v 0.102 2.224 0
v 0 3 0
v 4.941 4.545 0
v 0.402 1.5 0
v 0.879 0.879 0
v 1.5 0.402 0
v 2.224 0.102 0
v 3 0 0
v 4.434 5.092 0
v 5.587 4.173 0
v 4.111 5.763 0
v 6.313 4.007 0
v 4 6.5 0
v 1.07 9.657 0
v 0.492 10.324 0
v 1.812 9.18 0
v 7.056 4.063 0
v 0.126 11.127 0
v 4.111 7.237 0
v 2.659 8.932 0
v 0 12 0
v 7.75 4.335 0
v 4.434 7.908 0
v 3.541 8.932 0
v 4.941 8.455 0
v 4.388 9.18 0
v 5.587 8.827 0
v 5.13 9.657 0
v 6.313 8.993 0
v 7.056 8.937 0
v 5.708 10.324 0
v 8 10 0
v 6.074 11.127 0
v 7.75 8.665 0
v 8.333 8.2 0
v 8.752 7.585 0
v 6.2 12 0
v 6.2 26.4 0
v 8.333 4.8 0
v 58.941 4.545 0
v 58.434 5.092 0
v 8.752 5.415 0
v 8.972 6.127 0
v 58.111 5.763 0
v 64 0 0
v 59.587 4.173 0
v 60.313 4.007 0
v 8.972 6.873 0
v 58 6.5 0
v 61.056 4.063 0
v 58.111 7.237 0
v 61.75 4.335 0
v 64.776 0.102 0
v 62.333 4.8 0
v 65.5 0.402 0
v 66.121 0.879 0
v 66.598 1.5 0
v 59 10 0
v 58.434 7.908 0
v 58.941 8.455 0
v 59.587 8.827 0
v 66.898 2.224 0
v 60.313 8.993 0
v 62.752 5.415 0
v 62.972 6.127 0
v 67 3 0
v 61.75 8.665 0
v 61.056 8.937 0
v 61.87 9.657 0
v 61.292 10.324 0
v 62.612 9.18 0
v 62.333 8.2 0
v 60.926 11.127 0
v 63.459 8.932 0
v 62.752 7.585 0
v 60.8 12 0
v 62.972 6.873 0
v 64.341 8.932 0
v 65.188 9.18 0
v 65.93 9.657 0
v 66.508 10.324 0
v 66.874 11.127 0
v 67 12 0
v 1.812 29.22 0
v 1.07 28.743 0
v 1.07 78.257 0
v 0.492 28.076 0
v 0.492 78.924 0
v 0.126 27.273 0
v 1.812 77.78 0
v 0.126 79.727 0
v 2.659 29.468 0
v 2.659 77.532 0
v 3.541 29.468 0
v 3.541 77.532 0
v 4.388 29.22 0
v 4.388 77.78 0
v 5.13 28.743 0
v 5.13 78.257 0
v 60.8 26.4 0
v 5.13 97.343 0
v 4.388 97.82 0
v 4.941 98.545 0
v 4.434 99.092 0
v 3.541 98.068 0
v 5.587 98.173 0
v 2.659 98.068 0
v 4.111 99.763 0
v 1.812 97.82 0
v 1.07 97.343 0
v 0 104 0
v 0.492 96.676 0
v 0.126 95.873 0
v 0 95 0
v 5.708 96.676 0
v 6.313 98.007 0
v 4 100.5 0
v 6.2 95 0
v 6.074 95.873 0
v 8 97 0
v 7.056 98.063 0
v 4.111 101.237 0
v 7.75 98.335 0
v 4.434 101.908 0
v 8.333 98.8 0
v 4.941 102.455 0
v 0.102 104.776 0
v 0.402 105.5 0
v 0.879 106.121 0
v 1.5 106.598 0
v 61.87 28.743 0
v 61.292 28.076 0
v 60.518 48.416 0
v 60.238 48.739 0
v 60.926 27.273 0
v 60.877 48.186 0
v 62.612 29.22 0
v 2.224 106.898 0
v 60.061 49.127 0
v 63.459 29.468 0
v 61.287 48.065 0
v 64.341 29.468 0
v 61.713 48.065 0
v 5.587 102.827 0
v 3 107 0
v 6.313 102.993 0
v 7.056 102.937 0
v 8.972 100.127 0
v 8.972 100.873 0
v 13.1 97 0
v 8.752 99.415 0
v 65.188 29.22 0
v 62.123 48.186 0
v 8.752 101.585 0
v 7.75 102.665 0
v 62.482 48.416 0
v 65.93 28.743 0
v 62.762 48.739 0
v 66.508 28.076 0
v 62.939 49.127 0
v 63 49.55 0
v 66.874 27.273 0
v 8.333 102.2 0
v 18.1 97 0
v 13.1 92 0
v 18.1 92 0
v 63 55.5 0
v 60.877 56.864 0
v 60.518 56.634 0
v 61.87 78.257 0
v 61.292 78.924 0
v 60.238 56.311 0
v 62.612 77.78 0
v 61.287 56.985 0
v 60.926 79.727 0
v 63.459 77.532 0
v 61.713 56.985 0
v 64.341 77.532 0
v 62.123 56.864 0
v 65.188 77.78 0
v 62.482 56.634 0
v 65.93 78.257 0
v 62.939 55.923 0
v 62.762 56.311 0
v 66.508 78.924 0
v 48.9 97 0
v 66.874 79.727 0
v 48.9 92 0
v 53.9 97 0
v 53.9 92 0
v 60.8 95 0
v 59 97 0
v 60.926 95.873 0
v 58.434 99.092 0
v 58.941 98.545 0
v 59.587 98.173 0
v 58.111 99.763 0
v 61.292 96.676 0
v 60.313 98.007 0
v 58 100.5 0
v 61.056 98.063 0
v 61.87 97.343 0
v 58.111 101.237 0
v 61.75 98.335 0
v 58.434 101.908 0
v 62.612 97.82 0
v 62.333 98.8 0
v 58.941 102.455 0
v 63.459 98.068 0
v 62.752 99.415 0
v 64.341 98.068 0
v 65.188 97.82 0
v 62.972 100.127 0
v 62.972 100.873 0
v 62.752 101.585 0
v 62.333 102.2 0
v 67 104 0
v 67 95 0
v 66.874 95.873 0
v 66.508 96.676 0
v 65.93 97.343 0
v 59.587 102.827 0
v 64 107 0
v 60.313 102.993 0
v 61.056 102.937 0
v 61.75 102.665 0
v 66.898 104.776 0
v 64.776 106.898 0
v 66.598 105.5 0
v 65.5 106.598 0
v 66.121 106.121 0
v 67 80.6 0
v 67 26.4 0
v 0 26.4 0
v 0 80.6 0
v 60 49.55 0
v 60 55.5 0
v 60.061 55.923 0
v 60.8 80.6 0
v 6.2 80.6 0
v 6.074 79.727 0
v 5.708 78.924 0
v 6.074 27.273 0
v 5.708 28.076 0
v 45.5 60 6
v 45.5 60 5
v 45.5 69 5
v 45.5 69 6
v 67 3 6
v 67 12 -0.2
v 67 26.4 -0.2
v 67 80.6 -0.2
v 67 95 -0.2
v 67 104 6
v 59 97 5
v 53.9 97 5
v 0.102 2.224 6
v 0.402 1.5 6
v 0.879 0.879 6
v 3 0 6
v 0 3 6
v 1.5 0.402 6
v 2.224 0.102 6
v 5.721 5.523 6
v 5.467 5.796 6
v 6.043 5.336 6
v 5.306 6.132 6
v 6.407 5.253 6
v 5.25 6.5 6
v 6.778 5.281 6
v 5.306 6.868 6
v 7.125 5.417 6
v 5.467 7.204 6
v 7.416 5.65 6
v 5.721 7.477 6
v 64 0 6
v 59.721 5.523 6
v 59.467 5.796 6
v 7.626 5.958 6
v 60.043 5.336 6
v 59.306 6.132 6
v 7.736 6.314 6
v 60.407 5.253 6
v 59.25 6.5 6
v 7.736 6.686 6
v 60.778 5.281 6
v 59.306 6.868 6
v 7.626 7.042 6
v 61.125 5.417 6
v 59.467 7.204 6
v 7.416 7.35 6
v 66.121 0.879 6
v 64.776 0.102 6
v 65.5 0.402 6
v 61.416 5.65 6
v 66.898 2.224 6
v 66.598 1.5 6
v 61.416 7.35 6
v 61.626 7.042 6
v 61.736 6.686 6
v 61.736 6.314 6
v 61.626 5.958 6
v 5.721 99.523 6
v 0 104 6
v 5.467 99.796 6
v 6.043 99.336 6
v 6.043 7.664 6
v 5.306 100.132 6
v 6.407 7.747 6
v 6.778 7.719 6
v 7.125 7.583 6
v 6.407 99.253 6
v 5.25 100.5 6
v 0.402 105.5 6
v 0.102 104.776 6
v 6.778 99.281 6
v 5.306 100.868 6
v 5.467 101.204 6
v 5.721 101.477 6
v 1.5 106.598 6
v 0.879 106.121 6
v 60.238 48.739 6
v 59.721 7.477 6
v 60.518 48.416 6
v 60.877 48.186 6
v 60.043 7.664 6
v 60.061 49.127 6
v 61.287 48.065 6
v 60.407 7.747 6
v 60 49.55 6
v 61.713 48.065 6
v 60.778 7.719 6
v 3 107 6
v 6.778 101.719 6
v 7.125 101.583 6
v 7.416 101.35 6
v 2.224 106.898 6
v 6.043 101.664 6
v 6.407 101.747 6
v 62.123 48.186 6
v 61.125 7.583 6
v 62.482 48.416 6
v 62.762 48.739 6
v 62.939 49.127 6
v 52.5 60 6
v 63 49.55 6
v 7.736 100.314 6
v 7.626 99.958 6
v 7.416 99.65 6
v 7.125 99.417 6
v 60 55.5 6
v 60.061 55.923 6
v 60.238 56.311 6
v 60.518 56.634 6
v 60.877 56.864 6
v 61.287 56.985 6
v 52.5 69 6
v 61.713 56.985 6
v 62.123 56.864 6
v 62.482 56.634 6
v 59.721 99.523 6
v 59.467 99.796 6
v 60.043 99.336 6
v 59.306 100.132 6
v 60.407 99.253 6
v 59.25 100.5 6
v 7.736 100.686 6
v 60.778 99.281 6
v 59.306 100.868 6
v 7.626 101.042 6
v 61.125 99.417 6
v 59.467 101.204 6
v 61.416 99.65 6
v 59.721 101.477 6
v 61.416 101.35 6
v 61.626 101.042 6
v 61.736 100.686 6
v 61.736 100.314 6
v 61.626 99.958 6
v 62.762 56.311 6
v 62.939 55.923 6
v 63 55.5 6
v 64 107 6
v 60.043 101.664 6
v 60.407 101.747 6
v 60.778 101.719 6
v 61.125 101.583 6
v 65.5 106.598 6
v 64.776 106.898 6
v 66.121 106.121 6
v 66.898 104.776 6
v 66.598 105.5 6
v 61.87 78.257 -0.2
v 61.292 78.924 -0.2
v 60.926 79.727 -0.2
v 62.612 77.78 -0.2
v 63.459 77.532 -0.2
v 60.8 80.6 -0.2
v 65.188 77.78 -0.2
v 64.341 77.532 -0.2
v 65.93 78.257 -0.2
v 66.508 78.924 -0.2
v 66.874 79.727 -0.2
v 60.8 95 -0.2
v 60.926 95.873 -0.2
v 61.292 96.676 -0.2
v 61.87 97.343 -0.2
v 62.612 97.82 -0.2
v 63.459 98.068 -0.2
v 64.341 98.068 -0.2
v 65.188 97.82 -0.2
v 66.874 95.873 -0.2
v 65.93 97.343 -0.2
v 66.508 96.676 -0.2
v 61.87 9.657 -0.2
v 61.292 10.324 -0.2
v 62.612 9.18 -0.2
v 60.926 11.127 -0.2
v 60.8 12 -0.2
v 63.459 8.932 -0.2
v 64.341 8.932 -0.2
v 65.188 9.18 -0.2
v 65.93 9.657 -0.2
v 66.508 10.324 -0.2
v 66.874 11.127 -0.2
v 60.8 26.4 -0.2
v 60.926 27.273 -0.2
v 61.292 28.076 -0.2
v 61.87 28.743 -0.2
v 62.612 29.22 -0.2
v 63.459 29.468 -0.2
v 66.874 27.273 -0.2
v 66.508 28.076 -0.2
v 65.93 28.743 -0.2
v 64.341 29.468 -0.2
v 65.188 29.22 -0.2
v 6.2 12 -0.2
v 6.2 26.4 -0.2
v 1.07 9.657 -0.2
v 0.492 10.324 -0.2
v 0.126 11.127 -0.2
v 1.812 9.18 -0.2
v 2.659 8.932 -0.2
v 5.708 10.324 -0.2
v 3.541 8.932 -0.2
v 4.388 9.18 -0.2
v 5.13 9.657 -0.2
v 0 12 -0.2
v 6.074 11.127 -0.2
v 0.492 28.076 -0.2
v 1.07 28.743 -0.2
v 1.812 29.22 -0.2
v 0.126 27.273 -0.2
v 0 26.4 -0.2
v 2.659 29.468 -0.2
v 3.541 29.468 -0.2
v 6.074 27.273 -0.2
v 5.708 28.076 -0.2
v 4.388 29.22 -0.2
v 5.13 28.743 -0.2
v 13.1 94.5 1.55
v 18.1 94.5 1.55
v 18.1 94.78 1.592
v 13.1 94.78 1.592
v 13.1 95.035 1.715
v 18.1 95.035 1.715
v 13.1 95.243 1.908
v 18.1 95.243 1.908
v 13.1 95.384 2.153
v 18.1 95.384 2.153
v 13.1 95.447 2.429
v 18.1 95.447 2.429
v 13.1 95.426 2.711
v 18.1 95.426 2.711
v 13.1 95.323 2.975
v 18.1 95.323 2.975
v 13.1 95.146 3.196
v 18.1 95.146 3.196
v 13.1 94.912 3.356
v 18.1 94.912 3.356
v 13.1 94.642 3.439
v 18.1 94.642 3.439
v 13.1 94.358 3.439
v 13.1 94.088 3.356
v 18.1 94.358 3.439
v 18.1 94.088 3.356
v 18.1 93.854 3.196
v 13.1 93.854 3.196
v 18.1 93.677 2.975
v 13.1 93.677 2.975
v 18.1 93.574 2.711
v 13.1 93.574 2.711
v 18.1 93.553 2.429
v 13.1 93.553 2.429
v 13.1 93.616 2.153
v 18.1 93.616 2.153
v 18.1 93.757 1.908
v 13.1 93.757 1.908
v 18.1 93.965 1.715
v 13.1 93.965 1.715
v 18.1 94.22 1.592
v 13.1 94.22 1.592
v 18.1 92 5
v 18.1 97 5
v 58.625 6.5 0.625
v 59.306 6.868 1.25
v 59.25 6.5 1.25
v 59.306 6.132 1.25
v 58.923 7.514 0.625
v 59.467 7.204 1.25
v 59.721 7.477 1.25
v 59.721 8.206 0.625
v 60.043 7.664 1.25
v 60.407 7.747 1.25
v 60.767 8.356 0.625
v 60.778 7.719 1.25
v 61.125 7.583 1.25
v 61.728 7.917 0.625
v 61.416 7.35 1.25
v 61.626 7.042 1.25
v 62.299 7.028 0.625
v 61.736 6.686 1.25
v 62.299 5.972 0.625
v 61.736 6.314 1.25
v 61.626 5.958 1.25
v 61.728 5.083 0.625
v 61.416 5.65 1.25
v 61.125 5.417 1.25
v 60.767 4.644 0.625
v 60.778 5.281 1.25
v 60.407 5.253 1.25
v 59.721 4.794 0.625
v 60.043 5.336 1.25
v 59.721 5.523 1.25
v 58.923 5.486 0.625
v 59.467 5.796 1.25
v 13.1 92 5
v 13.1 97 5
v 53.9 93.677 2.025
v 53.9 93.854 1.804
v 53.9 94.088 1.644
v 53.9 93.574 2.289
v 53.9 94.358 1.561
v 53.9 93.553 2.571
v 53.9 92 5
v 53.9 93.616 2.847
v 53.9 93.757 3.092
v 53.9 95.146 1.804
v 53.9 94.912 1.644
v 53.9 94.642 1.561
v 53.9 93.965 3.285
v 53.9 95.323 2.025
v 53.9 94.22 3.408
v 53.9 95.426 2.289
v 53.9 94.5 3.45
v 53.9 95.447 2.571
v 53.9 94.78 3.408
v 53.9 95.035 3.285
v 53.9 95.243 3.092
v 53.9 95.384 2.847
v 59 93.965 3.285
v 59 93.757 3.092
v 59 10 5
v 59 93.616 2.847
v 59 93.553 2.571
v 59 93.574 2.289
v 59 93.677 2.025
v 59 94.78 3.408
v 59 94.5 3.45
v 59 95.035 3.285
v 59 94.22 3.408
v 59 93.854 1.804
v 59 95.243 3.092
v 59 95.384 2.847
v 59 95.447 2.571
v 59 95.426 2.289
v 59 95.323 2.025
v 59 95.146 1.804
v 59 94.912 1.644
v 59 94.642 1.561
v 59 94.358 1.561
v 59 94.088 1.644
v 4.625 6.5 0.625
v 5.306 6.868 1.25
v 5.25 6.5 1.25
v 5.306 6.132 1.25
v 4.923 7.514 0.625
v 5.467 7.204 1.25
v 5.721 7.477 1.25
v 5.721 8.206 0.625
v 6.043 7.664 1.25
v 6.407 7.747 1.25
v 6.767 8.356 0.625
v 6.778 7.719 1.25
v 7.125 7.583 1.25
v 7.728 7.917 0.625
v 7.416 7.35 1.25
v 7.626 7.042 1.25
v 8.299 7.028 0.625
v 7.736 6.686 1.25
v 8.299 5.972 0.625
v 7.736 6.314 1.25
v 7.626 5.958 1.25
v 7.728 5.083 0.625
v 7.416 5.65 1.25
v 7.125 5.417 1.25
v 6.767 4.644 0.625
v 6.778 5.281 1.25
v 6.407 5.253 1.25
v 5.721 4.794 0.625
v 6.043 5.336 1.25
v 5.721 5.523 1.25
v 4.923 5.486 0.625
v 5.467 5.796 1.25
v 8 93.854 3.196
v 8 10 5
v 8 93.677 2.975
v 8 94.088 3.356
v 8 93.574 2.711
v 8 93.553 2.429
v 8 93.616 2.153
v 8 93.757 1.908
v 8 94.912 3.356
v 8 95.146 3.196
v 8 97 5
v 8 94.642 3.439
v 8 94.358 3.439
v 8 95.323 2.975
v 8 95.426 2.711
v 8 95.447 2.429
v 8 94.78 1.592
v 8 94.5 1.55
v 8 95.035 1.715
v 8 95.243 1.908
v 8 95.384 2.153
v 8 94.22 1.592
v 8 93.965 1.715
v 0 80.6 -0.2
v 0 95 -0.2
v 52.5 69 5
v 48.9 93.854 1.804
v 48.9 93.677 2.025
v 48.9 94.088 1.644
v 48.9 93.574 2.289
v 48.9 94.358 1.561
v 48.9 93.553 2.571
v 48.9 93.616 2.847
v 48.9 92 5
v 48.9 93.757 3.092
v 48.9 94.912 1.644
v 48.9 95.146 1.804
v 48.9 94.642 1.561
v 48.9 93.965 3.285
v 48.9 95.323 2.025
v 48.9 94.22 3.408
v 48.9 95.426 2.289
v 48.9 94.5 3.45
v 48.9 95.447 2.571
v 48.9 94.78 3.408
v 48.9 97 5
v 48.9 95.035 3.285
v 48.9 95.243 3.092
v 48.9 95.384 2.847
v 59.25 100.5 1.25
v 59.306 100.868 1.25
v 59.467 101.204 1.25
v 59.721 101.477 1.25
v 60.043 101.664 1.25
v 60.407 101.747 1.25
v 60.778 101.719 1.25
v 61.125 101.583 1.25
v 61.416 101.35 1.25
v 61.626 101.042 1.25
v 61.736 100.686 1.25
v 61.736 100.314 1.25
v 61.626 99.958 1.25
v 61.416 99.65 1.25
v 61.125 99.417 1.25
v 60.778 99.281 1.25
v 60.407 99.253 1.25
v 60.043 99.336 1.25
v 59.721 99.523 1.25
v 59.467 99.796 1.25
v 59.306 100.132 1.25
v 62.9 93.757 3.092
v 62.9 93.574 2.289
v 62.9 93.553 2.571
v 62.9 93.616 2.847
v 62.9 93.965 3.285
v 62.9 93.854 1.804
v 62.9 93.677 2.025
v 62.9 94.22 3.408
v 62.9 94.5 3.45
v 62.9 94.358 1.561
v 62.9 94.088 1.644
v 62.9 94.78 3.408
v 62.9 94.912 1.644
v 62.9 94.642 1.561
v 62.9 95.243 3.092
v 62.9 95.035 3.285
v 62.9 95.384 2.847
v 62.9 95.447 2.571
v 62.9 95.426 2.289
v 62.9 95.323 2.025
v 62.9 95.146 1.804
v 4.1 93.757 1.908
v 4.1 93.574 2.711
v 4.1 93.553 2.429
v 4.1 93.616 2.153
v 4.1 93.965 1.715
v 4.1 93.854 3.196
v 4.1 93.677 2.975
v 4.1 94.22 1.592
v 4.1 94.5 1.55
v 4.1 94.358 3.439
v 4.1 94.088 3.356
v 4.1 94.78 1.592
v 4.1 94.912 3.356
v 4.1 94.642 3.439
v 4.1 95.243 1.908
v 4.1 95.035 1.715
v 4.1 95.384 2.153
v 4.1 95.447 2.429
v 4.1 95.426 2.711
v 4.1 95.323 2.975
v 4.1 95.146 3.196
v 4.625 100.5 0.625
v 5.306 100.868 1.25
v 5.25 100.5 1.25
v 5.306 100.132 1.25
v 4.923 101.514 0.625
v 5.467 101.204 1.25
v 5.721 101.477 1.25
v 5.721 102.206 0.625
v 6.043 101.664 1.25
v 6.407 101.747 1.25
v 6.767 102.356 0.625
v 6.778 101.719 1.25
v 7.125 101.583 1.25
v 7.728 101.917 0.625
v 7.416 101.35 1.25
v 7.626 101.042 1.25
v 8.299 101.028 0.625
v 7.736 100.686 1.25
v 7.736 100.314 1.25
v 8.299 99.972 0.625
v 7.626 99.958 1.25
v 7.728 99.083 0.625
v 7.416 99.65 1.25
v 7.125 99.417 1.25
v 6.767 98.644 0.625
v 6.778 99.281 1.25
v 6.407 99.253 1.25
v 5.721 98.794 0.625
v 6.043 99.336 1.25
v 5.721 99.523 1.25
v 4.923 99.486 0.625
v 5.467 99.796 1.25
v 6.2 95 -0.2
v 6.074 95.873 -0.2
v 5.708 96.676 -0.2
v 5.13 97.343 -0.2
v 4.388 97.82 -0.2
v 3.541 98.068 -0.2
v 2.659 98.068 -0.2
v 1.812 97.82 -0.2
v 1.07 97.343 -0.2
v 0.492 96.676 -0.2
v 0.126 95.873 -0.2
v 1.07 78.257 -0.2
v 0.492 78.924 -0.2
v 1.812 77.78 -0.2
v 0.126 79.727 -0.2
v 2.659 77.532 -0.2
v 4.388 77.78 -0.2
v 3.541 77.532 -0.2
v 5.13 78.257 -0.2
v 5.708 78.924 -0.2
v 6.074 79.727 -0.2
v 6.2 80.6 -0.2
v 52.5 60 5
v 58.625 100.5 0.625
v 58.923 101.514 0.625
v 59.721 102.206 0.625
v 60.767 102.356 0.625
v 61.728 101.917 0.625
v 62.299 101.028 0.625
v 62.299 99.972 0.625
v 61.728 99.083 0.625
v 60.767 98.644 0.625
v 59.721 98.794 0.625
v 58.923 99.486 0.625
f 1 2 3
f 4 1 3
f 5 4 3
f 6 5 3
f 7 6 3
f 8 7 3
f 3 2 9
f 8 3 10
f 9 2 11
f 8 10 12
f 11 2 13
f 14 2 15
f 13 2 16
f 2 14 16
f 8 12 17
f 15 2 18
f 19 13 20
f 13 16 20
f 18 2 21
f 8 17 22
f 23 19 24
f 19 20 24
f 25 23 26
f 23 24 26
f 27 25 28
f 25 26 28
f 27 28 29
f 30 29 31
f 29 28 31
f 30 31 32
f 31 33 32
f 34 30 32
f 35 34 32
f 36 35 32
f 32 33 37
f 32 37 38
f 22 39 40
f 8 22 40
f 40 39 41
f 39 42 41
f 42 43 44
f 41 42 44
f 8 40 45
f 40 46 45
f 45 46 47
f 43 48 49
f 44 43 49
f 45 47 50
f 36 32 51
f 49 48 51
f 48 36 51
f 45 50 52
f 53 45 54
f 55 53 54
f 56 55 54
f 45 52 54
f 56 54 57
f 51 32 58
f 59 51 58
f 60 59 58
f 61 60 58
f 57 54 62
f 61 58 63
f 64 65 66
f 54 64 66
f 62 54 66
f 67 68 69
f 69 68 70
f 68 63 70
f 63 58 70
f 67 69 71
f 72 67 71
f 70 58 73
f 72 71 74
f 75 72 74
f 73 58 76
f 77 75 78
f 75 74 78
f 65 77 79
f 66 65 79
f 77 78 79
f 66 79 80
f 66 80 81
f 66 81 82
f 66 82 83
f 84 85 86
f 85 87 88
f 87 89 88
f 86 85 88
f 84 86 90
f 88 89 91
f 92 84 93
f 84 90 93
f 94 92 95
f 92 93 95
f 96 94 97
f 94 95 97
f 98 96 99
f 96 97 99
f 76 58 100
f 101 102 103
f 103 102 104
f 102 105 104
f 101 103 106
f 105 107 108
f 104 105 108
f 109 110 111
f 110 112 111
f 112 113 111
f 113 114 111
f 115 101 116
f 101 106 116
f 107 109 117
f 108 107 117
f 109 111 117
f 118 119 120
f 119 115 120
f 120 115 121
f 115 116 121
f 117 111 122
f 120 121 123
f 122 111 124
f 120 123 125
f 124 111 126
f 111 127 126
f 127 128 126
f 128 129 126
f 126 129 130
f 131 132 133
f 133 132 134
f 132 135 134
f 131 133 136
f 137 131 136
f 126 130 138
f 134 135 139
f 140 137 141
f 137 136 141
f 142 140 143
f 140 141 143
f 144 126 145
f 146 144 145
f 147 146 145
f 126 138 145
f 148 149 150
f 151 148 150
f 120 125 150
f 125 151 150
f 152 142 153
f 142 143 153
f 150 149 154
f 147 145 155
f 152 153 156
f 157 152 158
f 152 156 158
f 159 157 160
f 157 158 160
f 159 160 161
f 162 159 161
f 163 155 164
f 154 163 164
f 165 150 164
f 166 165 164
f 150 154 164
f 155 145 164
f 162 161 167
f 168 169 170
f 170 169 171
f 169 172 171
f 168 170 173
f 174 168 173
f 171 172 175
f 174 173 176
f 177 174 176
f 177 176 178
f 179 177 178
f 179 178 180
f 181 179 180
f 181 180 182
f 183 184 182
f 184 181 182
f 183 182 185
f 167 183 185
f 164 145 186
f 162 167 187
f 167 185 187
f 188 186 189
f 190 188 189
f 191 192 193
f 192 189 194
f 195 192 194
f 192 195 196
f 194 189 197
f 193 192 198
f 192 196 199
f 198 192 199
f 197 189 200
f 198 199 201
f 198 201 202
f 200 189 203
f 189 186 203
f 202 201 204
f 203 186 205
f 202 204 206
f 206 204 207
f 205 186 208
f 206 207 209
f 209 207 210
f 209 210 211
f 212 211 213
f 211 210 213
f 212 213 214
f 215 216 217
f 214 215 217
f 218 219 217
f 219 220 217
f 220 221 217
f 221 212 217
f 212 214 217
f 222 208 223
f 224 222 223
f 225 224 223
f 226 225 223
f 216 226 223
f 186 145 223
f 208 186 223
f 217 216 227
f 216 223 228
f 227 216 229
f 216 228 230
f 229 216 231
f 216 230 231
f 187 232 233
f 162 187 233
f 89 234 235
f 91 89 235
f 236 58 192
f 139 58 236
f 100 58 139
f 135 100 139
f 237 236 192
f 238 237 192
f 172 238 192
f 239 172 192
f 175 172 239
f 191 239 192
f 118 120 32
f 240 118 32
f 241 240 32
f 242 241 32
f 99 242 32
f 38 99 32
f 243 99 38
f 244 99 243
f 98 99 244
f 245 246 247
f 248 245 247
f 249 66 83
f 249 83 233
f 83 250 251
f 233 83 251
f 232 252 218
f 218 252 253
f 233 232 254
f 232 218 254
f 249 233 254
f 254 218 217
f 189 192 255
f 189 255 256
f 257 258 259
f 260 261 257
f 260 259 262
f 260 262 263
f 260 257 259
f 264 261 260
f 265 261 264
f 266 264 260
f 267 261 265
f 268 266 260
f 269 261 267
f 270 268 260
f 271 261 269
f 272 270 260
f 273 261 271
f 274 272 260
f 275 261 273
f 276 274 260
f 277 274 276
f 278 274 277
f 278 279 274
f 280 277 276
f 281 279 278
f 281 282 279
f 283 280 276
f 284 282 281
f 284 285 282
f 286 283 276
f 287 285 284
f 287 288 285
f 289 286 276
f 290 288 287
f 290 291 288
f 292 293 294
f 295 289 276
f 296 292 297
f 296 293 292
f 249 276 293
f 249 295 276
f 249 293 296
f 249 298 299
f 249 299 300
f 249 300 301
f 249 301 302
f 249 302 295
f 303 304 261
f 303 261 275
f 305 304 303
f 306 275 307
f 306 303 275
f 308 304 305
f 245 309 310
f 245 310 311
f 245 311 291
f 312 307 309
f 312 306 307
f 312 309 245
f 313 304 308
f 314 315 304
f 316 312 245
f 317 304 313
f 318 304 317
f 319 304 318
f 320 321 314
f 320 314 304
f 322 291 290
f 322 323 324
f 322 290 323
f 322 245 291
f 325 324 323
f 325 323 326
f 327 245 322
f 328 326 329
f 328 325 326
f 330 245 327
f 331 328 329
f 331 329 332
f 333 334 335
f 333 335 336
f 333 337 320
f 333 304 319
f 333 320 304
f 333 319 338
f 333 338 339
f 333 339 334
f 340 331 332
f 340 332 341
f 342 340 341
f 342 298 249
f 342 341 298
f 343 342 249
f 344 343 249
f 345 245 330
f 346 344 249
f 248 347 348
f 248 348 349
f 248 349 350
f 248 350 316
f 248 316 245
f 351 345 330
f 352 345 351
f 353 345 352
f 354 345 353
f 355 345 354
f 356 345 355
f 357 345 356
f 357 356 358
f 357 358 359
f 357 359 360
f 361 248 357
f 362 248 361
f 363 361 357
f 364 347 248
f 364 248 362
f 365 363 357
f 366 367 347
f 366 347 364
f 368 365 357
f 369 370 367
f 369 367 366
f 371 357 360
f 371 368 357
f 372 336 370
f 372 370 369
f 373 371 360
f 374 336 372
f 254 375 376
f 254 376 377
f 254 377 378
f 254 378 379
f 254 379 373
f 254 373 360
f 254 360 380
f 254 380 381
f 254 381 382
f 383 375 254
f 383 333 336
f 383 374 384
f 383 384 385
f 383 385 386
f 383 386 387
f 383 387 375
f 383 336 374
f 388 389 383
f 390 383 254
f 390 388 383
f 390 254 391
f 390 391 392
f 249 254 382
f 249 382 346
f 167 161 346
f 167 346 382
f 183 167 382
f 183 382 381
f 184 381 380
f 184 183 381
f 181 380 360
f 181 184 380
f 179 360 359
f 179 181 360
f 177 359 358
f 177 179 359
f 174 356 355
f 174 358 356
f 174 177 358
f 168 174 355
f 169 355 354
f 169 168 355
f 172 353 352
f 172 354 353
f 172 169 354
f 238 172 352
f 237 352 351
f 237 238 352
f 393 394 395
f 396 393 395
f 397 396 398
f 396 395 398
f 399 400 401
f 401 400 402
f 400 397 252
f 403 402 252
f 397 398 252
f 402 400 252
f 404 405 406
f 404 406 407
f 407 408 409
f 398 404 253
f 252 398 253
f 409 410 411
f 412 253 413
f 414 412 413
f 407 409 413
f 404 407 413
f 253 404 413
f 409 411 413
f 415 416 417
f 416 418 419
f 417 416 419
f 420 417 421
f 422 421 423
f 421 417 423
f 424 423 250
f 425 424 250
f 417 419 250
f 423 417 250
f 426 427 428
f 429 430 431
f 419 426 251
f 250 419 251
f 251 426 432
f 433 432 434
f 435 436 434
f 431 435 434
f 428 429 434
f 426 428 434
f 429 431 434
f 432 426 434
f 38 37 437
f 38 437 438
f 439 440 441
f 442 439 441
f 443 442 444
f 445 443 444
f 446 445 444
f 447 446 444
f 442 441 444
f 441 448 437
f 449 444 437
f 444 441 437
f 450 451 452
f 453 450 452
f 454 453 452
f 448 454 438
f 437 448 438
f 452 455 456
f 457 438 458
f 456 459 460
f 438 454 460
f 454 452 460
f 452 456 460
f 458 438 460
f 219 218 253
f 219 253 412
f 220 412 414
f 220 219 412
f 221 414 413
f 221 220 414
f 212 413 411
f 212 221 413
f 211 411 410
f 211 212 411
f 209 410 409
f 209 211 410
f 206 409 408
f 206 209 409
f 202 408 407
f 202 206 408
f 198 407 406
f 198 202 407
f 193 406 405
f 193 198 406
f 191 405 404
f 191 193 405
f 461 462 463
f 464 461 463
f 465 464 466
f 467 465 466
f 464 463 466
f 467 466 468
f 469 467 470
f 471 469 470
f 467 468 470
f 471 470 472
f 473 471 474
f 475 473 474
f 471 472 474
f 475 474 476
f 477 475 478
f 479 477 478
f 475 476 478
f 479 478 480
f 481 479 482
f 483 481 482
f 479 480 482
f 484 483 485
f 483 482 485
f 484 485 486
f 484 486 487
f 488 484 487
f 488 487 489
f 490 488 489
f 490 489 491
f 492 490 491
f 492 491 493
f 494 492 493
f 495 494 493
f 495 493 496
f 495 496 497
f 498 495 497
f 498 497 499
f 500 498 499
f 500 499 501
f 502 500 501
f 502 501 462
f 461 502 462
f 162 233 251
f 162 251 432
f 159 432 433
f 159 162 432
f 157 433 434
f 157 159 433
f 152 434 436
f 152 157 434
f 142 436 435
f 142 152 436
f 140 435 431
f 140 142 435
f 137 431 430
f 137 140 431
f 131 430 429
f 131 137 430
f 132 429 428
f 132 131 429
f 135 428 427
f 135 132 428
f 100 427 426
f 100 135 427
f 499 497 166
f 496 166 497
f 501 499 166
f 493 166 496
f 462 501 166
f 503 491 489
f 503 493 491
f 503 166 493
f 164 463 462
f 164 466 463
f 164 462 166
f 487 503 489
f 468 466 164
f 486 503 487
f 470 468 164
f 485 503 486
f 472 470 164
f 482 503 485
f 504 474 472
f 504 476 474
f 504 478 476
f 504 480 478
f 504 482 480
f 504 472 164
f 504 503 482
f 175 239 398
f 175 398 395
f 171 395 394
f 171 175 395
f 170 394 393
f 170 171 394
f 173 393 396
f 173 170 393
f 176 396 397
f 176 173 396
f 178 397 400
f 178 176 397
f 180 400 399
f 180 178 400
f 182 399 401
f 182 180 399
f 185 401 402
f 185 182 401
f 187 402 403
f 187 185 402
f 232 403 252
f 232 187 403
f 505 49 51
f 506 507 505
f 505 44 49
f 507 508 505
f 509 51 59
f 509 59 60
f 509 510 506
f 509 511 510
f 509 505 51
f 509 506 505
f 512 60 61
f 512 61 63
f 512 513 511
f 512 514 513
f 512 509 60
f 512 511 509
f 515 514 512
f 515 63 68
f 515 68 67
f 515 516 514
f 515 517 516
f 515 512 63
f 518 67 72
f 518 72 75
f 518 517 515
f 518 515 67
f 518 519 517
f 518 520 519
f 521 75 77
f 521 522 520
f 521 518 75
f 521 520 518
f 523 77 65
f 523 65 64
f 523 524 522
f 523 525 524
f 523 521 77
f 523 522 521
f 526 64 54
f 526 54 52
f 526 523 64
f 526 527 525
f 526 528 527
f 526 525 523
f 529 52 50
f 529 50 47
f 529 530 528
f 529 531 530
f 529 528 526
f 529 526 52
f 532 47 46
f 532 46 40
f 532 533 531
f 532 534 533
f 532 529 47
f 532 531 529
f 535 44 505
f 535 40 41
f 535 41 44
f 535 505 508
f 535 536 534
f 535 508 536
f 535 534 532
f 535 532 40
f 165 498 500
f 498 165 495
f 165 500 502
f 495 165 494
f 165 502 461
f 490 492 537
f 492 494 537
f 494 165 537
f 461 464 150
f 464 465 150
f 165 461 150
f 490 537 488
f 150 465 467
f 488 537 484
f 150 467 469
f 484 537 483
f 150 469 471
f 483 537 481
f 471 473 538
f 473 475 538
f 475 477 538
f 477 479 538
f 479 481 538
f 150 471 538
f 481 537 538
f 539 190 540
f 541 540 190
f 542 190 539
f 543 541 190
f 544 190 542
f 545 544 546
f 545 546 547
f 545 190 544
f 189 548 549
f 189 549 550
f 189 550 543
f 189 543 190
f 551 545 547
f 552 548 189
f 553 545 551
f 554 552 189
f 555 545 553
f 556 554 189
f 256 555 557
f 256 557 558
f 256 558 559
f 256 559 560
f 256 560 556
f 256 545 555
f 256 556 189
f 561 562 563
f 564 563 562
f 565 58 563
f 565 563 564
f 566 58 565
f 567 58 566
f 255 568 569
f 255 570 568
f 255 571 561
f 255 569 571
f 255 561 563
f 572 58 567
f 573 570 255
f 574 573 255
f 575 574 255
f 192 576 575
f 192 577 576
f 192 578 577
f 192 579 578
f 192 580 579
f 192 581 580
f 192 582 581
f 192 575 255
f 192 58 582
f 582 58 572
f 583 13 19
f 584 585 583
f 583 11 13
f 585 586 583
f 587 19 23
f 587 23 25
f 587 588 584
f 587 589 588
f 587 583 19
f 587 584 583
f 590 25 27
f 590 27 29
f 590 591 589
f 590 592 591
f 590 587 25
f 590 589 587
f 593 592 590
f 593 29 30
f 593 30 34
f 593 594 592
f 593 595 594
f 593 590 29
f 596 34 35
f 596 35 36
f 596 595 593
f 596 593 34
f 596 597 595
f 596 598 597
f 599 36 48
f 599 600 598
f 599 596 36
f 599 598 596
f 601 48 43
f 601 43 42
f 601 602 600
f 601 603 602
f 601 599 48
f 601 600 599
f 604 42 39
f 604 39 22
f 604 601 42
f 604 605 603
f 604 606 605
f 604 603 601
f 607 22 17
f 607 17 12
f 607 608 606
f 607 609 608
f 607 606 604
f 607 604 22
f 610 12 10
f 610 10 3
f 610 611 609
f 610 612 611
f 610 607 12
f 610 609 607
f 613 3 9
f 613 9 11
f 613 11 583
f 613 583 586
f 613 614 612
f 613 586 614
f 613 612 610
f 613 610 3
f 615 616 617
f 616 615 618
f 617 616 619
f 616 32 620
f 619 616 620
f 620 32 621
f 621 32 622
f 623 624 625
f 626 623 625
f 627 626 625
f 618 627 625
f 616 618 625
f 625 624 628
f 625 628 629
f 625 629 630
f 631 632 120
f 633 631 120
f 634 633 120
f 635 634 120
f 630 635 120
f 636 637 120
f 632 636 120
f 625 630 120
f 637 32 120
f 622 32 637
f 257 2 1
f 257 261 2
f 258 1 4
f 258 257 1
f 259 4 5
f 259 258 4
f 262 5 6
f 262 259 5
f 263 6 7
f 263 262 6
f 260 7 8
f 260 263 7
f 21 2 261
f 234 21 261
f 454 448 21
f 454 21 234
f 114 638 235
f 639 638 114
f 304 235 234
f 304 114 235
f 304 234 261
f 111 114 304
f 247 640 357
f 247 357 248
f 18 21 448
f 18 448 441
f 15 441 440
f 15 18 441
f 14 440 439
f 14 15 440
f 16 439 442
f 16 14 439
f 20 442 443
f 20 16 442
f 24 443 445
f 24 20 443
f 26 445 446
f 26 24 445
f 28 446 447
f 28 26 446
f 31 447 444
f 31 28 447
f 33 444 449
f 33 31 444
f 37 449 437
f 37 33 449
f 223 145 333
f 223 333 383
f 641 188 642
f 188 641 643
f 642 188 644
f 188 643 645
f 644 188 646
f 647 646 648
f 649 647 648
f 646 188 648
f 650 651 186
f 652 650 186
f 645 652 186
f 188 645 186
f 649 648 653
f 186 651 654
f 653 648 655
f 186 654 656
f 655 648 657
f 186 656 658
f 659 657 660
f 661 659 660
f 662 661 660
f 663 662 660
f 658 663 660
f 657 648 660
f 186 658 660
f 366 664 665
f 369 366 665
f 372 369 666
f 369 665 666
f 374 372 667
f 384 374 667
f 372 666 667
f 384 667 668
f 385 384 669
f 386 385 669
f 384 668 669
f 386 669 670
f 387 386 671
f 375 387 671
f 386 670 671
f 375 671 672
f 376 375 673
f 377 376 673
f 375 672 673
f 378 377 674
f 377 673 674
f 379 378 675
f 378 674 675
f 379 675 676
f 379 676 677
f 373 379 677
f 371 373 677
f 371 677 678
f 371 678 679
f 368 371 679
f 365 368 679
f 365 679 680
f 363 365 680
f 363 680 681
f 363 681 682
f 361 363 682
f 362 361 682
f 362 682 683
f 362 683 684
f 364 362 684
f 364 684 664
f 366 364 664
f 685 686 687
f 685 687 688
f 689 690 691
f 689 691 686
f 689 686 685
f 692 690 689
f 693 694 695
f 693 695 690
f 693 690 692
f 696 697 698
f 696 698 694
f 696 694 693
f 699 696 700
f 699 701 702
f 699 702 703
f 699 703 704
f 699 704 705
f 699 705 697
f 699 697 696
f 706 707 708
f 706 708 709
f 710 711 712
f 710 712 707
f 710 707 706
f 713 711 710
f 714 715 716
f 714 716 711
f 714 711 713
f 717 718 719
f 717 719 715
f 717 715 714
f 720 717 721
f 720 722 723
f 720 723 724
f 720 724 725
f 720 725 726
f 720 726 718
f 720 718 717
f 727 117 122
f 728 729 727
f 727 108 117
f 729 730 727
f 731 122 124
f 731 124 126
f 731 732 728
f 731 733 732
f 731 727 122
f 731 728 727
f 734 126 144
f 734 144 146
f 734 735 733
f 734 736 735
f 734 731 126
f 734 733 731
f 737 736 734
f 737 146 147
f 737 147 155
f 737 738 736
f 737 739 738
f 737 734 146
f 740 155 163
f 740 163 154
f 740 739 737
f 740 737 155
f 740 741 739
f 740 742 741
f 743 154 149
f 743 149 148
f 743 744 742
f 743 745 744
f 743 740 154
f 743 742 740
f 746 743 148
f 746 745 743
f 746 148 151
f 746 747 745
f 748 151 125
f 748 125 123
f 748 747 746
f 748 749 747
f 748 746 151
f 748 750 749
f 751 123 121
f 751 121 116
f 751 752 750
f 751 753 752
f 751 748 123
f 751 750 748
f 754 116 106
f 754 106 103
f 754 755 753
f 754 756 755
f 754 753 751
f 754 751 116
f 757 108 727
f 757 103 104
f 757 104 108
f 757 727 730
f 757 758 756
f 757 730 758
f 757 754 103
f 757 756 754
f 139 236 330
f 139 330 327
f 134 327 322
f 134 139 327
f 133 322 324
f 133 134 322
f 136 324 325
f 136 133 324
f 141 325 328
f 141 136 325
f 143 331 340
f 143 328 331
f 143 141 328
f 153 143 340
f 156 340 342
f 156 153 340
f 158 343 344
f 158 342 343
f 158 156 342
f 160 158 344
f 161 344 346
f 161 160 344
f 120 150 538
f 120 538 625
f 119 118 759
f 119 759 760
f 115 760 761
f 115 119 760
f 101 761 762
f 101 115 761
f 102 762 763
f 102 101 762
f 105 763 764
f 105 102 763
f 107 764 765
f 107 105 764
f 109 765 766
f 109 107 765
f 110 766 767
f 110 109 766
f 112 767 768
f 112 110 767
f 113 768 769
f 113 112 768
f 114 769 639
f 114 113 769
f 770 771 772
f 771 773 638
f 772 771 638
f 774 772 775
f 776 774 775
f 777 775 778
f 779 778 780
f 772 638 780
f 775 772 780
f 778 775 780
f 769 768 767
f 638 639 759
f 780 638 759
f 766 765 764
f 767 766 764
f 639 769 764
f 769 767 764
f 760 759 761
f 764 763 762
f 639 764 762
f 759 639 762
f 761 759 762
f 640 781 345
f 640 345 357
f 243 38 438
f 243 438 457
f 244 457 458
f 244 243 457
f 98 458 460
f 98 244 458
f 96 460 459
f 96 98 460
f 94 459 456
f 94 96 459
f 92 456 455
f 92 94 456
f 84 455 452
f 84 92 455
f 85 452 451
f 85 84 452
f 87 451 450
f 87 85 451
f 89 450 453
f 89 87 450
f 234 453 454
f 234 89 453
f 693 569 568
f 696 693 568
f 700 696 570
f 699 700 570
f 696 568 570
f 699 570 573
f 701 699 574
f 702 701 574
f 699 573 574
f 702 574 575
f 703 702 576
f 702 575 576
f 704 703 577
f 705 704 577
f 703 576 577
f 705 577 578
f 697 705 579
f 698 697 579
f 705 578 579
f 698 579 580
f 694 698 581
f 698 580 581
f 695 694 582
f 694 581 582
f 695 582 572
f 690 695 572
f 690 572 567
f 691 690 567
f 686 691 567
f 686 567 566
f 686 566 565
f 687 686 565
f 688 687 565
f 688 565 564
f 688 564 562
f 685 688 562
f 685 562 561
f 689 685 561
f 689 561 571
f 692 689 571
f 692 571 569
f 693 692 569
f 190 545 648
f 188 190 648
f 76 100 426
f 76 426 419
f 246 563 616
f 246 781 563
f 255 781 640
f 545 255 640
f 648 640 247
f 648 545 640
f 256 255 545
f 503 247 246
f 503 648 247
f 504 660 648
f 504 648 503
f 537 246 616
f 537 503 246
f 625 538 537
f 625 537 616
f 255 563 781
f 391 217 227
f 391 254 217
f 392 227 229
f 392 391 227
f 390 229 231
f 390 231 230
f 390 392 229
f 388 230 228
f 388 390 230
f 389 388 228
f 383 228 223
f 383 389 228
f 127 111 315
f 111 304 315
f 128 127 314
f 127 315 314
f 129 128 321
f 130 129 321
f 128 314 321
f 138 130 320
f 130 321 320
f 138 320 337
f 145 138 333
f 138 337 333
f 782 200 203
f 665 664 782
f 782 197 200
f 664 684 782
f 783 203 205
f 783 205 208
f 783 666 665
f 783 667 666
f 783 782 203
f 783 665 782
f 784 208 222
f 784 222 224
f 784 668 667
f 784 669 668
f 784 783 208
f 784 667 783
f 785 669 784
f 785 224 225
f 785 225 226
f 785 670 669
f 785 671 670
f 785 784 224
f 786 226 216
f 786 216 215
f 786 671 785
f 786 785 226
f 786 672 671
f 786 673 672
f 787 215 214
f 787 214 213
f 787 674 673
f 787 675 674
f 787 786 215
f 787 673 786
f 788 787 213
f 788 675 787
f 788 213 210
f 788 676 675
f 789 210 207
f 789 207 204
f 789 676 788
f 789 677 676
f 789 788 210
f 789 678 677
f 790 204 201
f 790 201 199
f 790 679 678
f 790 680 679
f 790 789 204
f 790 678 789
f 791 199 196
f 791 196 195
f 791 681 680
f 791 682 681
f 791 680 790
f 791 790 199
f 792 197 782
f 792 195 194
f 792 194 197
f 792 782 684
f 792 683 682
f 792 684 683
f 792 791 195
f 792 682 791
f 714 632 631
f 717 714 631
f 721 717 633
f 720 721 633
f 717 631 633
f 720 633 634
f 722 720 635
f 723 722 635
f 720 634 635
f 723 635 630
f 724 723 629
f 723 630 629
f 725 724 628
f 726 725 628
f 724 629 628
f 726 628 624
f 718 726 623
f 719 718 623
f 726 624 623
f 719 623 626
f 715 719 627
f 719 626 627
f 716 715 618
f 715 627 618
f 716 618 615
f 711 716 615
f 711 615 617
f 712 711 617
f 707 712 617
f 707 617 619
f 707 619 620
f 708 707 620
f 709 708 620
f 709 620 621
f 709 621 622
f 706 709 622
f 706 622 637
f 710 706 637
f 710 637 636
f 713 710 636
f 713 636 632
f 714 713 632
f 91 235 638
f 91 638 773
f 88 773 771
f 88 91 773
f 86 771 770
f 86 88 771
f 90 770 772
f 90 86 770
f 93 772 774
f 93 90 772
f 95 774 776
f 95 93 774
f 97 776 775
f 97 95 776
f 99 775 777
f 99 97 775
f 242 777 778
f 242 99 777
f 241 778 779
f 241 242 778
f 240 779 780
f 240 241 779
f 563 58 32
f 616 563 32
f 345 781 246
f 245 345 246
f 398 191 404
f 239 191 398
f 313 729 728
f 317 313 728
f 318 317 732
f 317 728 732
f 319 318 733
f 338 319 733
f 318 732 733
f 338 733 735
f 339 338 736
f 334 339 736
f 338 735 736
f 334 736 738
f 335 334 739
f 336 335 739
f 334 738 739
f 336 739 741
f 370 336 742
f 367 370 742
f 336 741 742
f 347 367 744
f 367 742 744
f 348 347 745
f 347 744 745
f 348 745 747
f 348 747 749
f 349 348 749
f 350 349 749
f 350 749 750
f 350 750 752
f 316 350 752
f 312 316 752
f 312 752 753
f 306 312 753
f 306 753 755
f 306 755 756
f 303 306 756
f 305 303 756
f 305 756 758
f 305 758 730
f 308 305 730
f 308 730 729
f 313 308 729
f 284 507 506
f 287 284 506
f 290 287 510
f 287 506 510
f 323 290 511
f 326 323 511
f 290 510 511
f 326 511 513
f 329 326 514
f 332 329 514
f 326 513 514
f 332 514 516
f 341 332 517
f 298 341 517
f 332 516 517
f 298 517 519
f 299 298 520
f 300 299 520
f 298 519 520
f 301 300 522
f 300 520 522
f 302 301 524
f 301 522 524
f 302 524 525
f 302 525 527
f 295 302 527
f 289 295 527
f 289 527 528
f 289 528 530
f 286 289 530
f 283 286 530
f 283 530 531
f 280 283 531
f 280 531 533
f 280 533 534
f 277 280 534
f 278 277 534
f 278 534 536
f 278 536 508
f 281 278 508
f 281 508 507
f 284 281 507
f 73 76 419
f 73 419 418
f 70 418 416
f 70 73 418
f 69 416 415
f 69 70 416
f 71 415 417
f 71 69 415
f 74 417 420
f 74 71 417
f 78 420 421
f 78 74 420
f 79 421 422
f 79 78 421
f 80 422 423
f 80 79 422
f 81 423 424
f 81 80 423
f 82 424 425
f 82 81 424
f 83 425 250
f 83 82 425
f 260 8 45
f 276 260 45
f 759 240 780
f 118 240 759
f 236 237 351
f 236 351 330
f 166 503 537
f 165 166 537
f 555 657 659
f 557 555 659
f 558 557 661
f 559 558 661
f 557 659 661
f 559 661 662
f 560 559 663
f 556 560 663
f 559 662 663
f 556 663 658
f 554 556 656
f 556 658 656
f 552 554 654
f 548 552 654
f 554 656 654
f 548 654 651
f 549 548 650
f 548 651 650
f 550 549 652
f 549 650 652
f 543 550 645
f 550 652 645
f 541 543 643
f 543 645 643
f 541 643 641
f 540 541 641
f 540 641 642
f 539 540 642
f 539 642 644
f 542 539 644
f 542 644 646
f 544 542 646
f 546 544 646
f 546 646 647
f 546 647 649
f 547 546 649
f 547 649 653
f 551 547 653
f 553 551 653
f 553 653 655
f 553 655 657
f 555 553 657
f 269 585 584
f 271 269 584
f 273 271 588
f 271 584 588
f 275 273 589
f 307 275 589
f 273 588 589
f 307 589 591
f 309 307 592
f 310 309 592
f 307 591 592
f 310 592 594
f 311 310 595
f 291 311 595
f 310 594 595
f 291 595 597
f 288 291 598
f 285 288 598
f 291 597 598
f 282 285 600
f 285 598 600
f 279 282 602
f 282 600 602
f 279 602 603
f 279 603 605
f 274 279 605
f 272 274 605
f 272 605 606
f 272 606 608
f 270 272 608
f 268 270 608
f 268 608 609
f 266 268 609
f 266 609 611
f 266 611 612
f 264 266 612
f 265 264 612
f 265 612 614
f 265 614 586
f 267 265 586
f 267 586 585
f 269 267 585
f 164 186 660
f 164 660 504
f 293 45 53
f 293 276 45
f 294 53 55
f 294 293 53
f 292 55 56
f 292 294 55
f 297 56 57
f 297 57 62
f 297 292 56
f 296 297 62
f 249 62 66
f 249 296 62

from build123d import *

# Parameters (mm, degrees)
SKICA1_W                 = 67
SKICA1_H                 = 107
P_IDAT_VYSUNUT_M1_DEPTH  = 6
ZAOBLIT1_R               = 3
SKICA2_R                 = 1.25
ODEBRAT_VYSUNUT_M1_DEPTH = 7
ZKOSEN_1_SIZE            = 1.25
SKICA4_W                 = 7
SKICA4_H                 = 9
ODEBRAT_VYSUNUT_M2_DEPTH = 7
SKICA7_W                 = 51
SKICA7_H                 = 87
ODEBRAT_VYSUNUT_M3_DEPTH = 5
SKICA8_W                 = 5
SKICA8_H                 = 5
P_IDAT_VYSUNUT_M2_DEPTH  = 5
SKICA9_R                 = 0.95
ODEBRAT_VYSUNUT_M4_DEPTH = 14
SKICA10_R                = 0.95
ODEBRAT_VYSUNUT_M5_DEPTH = 14
P_IDAT_VYSUNUT_M3_DEPTH  = 0.2


with BuildPart() as part:
    # Skica1 → Přidat vysunutím1 (new body)
    with BuildSketch(Plane.XY):
        with Locations((33.5, 53.5)):
            Rectangle(SKICA1_W, SKICA1_H)
    extrude(amount=P_IDAT_VYSUNUT_M1_DEPTH)

    # Zaoblit1
    zaoblit1_edges = [part.edges().sort_by_distance(p)[0] for p in [
        (0, 107, 3),
        (67, 107, 3),
        (67, 0, 3),
        (0, 0, 3),
    ]]
    fillet(zaoblit1_edges, radius=ZAOBLIT1_R)

    # Skica2 → Odebrat vysunutím1 (cut, through all)
    with BuildSketch(Plane(origin=(0, 0, 0), x_dir=(-1, 0, 0), z_dir=(0, 0, -1))):
        with Locations((-6.5, 100.5)):
            Circle(SKICA2_R)
        with Locations((-60.5, 100.5)):
            Circle(SKICA2_R)
        with Locations((-6.5, 6.5)):
            Circle(SKICA2_R)
        with Locations((-60.5, 6.5)):
            Circle(SKICA2_R)
    extrude(amount=-ODEBRAT_VYSUNUT_M1_DEPTH, mode=Mode.SUBTRACT)

    # Zkosení1
    zkosen_1_edges = [part.edges().sort_by_distance(p)[0] for p in [
        (61.75, 100.5, 0),
        (7.75, 6.5, 0),
        (61.75, 6.5, 0),
        (7.75, 100.5, 0),
    ]]
    chamfer(zkosen_1_edges, length=ZKOSEN_1_SIZE)

    # Skica4 → Odebrat vysunutím2 (cut, through all)
    with BuildSketch(Plane(origin=(0, 0, 0), x_dir=(-1, 0, 0), z_dir=(0, 0, -1))):
        with Locations((-49, 64.5)):
            Rectangle(SKICA4_W, SKICA4_H)
        with BuildLine():
            Line((-60, 55.5), (-60, 49.55))
            ThreePointArc((-60, 49.55), (-61.5, 48.05), (-63, 49.55))
            Line((-63, 49.55), (-63, 55.5))
            ThreePointArc((-63, 55.5), (-61.5, 57), (-60, 55.5))
        make_face()
    extrude(amount=-ODEBRAT_VYSUNUT_M2_DEPTH, mode=Mode.SUBTRACT)

    # Skica7 → Odebrat vysunutím3 (cut)
    with BuildSketch(Plane(origin=(0, 0, 0), x_dir=(-1, 0, 0), z_dir=(0, 0, -1))):
        with Locations((-33.5, 53.5)):
            Rectangle(SKICA7_W, SKICA7_H)
    extrude(amount=-ODEBRAT_VYSUNUT_M3_DEPTH, mode=Mode.SUBTRACT)

    # Skica8 → Přidat vysunutím2 (add)
    with BuildSketch(Plane(origin=(0, 0, 5), x_dir=(-1, 0, 0), z_dir=(0, 0, -1))):
        with Locations((-51.4, 94.5)):
            Rectangle(SKICA8_W, SKICA8_H)
        with Locations((-15.6, 94.5)):
            Rectangle(SKICA8_W, SKICA8_H)
    extrude(amount=P_IDAT_VYSUNUT_M2_DEPTH)

    # Skica9 → Odebrat vysunutím4 (cut)
    with BuildSketch(Plane.ZY.offset(-48.9)):
        with Locations((2.5, 94.5)):
            Circle(SKICA9_R)
    extrude(amount=-ODEBRAT_VYSUNUT_M4_DEPTH, mode=Mode.SUBTRACT)

    # Skica10 → Odebrat vysunutím5 (cut)
    with BuildSketch(Plane(origin=(18.1, 0, 0), x_dir=(0, 0, -1), z_dir=(1, 0, 0))):
        with Locations((-2.5, 94.5)):
            Circle(SKICA10_R)
    extrude(amount=-ODEBRAT_VYSUNUT_M5_DEPTH, mode=Mode.SUBTRACT)

    # Skica11 → Přidat vysunutím3 (add)
    with BuildSketch(Plane(origin=(0, 0, 0), x_dir=(-1, 0, 0), z_dir=(0, 0, -1))):
        with BuildLine():
            Line((0, 95), (0, 80.6))
            ThreePointArc((0, 80.6), (-3.1, 77.5), (-6.2, 80.6))
            Line((-6.2, 80.6), (-6.2, 95))
            ThreePointArc((-6.2, 95), (-3.1, 98.1), (0, 95))
        make_face()
        with BuildLine():
            Line((0, 26.4), (0, 12))
            ThreePointArc((0, 12), (-3.1, 8.9), (-6.2, 12))
            Line((-6.2, 12), (-6.2, 26.4))
            ThreePointArc((-6.2, 26.4), (-3.1, 29.5), (0, 26.4))
        make_face()
        with BuildLine():
            Line((-60.8, 95), (-60.8, 80.6))
            ThreePointArc((-60.8, 80.6), (-63.9, 77.5), (-67, 80.6))
            Line((-67, 80.6), (-67, 95))
            ThreePointArc((-67, 95), (-63.9, 98.1), (-60.8, 95))
        make_face()
        with BuildLine():
            Line((-60.8, 26.4), (-60.8, 12))
            ThreePointArc((-60.8, 12), (-63.9, 8.9), (-67, 12))
            Line((-67, 12), (-67, 26.4))
            ThreePointArc((-67, 26.4), (-63.9, 29.5), (-60.8, 26.4))
        make_face()
    extrude(amount=P_IDAT_VYSUNUT_M3_DEPTH)


solid = part.part
